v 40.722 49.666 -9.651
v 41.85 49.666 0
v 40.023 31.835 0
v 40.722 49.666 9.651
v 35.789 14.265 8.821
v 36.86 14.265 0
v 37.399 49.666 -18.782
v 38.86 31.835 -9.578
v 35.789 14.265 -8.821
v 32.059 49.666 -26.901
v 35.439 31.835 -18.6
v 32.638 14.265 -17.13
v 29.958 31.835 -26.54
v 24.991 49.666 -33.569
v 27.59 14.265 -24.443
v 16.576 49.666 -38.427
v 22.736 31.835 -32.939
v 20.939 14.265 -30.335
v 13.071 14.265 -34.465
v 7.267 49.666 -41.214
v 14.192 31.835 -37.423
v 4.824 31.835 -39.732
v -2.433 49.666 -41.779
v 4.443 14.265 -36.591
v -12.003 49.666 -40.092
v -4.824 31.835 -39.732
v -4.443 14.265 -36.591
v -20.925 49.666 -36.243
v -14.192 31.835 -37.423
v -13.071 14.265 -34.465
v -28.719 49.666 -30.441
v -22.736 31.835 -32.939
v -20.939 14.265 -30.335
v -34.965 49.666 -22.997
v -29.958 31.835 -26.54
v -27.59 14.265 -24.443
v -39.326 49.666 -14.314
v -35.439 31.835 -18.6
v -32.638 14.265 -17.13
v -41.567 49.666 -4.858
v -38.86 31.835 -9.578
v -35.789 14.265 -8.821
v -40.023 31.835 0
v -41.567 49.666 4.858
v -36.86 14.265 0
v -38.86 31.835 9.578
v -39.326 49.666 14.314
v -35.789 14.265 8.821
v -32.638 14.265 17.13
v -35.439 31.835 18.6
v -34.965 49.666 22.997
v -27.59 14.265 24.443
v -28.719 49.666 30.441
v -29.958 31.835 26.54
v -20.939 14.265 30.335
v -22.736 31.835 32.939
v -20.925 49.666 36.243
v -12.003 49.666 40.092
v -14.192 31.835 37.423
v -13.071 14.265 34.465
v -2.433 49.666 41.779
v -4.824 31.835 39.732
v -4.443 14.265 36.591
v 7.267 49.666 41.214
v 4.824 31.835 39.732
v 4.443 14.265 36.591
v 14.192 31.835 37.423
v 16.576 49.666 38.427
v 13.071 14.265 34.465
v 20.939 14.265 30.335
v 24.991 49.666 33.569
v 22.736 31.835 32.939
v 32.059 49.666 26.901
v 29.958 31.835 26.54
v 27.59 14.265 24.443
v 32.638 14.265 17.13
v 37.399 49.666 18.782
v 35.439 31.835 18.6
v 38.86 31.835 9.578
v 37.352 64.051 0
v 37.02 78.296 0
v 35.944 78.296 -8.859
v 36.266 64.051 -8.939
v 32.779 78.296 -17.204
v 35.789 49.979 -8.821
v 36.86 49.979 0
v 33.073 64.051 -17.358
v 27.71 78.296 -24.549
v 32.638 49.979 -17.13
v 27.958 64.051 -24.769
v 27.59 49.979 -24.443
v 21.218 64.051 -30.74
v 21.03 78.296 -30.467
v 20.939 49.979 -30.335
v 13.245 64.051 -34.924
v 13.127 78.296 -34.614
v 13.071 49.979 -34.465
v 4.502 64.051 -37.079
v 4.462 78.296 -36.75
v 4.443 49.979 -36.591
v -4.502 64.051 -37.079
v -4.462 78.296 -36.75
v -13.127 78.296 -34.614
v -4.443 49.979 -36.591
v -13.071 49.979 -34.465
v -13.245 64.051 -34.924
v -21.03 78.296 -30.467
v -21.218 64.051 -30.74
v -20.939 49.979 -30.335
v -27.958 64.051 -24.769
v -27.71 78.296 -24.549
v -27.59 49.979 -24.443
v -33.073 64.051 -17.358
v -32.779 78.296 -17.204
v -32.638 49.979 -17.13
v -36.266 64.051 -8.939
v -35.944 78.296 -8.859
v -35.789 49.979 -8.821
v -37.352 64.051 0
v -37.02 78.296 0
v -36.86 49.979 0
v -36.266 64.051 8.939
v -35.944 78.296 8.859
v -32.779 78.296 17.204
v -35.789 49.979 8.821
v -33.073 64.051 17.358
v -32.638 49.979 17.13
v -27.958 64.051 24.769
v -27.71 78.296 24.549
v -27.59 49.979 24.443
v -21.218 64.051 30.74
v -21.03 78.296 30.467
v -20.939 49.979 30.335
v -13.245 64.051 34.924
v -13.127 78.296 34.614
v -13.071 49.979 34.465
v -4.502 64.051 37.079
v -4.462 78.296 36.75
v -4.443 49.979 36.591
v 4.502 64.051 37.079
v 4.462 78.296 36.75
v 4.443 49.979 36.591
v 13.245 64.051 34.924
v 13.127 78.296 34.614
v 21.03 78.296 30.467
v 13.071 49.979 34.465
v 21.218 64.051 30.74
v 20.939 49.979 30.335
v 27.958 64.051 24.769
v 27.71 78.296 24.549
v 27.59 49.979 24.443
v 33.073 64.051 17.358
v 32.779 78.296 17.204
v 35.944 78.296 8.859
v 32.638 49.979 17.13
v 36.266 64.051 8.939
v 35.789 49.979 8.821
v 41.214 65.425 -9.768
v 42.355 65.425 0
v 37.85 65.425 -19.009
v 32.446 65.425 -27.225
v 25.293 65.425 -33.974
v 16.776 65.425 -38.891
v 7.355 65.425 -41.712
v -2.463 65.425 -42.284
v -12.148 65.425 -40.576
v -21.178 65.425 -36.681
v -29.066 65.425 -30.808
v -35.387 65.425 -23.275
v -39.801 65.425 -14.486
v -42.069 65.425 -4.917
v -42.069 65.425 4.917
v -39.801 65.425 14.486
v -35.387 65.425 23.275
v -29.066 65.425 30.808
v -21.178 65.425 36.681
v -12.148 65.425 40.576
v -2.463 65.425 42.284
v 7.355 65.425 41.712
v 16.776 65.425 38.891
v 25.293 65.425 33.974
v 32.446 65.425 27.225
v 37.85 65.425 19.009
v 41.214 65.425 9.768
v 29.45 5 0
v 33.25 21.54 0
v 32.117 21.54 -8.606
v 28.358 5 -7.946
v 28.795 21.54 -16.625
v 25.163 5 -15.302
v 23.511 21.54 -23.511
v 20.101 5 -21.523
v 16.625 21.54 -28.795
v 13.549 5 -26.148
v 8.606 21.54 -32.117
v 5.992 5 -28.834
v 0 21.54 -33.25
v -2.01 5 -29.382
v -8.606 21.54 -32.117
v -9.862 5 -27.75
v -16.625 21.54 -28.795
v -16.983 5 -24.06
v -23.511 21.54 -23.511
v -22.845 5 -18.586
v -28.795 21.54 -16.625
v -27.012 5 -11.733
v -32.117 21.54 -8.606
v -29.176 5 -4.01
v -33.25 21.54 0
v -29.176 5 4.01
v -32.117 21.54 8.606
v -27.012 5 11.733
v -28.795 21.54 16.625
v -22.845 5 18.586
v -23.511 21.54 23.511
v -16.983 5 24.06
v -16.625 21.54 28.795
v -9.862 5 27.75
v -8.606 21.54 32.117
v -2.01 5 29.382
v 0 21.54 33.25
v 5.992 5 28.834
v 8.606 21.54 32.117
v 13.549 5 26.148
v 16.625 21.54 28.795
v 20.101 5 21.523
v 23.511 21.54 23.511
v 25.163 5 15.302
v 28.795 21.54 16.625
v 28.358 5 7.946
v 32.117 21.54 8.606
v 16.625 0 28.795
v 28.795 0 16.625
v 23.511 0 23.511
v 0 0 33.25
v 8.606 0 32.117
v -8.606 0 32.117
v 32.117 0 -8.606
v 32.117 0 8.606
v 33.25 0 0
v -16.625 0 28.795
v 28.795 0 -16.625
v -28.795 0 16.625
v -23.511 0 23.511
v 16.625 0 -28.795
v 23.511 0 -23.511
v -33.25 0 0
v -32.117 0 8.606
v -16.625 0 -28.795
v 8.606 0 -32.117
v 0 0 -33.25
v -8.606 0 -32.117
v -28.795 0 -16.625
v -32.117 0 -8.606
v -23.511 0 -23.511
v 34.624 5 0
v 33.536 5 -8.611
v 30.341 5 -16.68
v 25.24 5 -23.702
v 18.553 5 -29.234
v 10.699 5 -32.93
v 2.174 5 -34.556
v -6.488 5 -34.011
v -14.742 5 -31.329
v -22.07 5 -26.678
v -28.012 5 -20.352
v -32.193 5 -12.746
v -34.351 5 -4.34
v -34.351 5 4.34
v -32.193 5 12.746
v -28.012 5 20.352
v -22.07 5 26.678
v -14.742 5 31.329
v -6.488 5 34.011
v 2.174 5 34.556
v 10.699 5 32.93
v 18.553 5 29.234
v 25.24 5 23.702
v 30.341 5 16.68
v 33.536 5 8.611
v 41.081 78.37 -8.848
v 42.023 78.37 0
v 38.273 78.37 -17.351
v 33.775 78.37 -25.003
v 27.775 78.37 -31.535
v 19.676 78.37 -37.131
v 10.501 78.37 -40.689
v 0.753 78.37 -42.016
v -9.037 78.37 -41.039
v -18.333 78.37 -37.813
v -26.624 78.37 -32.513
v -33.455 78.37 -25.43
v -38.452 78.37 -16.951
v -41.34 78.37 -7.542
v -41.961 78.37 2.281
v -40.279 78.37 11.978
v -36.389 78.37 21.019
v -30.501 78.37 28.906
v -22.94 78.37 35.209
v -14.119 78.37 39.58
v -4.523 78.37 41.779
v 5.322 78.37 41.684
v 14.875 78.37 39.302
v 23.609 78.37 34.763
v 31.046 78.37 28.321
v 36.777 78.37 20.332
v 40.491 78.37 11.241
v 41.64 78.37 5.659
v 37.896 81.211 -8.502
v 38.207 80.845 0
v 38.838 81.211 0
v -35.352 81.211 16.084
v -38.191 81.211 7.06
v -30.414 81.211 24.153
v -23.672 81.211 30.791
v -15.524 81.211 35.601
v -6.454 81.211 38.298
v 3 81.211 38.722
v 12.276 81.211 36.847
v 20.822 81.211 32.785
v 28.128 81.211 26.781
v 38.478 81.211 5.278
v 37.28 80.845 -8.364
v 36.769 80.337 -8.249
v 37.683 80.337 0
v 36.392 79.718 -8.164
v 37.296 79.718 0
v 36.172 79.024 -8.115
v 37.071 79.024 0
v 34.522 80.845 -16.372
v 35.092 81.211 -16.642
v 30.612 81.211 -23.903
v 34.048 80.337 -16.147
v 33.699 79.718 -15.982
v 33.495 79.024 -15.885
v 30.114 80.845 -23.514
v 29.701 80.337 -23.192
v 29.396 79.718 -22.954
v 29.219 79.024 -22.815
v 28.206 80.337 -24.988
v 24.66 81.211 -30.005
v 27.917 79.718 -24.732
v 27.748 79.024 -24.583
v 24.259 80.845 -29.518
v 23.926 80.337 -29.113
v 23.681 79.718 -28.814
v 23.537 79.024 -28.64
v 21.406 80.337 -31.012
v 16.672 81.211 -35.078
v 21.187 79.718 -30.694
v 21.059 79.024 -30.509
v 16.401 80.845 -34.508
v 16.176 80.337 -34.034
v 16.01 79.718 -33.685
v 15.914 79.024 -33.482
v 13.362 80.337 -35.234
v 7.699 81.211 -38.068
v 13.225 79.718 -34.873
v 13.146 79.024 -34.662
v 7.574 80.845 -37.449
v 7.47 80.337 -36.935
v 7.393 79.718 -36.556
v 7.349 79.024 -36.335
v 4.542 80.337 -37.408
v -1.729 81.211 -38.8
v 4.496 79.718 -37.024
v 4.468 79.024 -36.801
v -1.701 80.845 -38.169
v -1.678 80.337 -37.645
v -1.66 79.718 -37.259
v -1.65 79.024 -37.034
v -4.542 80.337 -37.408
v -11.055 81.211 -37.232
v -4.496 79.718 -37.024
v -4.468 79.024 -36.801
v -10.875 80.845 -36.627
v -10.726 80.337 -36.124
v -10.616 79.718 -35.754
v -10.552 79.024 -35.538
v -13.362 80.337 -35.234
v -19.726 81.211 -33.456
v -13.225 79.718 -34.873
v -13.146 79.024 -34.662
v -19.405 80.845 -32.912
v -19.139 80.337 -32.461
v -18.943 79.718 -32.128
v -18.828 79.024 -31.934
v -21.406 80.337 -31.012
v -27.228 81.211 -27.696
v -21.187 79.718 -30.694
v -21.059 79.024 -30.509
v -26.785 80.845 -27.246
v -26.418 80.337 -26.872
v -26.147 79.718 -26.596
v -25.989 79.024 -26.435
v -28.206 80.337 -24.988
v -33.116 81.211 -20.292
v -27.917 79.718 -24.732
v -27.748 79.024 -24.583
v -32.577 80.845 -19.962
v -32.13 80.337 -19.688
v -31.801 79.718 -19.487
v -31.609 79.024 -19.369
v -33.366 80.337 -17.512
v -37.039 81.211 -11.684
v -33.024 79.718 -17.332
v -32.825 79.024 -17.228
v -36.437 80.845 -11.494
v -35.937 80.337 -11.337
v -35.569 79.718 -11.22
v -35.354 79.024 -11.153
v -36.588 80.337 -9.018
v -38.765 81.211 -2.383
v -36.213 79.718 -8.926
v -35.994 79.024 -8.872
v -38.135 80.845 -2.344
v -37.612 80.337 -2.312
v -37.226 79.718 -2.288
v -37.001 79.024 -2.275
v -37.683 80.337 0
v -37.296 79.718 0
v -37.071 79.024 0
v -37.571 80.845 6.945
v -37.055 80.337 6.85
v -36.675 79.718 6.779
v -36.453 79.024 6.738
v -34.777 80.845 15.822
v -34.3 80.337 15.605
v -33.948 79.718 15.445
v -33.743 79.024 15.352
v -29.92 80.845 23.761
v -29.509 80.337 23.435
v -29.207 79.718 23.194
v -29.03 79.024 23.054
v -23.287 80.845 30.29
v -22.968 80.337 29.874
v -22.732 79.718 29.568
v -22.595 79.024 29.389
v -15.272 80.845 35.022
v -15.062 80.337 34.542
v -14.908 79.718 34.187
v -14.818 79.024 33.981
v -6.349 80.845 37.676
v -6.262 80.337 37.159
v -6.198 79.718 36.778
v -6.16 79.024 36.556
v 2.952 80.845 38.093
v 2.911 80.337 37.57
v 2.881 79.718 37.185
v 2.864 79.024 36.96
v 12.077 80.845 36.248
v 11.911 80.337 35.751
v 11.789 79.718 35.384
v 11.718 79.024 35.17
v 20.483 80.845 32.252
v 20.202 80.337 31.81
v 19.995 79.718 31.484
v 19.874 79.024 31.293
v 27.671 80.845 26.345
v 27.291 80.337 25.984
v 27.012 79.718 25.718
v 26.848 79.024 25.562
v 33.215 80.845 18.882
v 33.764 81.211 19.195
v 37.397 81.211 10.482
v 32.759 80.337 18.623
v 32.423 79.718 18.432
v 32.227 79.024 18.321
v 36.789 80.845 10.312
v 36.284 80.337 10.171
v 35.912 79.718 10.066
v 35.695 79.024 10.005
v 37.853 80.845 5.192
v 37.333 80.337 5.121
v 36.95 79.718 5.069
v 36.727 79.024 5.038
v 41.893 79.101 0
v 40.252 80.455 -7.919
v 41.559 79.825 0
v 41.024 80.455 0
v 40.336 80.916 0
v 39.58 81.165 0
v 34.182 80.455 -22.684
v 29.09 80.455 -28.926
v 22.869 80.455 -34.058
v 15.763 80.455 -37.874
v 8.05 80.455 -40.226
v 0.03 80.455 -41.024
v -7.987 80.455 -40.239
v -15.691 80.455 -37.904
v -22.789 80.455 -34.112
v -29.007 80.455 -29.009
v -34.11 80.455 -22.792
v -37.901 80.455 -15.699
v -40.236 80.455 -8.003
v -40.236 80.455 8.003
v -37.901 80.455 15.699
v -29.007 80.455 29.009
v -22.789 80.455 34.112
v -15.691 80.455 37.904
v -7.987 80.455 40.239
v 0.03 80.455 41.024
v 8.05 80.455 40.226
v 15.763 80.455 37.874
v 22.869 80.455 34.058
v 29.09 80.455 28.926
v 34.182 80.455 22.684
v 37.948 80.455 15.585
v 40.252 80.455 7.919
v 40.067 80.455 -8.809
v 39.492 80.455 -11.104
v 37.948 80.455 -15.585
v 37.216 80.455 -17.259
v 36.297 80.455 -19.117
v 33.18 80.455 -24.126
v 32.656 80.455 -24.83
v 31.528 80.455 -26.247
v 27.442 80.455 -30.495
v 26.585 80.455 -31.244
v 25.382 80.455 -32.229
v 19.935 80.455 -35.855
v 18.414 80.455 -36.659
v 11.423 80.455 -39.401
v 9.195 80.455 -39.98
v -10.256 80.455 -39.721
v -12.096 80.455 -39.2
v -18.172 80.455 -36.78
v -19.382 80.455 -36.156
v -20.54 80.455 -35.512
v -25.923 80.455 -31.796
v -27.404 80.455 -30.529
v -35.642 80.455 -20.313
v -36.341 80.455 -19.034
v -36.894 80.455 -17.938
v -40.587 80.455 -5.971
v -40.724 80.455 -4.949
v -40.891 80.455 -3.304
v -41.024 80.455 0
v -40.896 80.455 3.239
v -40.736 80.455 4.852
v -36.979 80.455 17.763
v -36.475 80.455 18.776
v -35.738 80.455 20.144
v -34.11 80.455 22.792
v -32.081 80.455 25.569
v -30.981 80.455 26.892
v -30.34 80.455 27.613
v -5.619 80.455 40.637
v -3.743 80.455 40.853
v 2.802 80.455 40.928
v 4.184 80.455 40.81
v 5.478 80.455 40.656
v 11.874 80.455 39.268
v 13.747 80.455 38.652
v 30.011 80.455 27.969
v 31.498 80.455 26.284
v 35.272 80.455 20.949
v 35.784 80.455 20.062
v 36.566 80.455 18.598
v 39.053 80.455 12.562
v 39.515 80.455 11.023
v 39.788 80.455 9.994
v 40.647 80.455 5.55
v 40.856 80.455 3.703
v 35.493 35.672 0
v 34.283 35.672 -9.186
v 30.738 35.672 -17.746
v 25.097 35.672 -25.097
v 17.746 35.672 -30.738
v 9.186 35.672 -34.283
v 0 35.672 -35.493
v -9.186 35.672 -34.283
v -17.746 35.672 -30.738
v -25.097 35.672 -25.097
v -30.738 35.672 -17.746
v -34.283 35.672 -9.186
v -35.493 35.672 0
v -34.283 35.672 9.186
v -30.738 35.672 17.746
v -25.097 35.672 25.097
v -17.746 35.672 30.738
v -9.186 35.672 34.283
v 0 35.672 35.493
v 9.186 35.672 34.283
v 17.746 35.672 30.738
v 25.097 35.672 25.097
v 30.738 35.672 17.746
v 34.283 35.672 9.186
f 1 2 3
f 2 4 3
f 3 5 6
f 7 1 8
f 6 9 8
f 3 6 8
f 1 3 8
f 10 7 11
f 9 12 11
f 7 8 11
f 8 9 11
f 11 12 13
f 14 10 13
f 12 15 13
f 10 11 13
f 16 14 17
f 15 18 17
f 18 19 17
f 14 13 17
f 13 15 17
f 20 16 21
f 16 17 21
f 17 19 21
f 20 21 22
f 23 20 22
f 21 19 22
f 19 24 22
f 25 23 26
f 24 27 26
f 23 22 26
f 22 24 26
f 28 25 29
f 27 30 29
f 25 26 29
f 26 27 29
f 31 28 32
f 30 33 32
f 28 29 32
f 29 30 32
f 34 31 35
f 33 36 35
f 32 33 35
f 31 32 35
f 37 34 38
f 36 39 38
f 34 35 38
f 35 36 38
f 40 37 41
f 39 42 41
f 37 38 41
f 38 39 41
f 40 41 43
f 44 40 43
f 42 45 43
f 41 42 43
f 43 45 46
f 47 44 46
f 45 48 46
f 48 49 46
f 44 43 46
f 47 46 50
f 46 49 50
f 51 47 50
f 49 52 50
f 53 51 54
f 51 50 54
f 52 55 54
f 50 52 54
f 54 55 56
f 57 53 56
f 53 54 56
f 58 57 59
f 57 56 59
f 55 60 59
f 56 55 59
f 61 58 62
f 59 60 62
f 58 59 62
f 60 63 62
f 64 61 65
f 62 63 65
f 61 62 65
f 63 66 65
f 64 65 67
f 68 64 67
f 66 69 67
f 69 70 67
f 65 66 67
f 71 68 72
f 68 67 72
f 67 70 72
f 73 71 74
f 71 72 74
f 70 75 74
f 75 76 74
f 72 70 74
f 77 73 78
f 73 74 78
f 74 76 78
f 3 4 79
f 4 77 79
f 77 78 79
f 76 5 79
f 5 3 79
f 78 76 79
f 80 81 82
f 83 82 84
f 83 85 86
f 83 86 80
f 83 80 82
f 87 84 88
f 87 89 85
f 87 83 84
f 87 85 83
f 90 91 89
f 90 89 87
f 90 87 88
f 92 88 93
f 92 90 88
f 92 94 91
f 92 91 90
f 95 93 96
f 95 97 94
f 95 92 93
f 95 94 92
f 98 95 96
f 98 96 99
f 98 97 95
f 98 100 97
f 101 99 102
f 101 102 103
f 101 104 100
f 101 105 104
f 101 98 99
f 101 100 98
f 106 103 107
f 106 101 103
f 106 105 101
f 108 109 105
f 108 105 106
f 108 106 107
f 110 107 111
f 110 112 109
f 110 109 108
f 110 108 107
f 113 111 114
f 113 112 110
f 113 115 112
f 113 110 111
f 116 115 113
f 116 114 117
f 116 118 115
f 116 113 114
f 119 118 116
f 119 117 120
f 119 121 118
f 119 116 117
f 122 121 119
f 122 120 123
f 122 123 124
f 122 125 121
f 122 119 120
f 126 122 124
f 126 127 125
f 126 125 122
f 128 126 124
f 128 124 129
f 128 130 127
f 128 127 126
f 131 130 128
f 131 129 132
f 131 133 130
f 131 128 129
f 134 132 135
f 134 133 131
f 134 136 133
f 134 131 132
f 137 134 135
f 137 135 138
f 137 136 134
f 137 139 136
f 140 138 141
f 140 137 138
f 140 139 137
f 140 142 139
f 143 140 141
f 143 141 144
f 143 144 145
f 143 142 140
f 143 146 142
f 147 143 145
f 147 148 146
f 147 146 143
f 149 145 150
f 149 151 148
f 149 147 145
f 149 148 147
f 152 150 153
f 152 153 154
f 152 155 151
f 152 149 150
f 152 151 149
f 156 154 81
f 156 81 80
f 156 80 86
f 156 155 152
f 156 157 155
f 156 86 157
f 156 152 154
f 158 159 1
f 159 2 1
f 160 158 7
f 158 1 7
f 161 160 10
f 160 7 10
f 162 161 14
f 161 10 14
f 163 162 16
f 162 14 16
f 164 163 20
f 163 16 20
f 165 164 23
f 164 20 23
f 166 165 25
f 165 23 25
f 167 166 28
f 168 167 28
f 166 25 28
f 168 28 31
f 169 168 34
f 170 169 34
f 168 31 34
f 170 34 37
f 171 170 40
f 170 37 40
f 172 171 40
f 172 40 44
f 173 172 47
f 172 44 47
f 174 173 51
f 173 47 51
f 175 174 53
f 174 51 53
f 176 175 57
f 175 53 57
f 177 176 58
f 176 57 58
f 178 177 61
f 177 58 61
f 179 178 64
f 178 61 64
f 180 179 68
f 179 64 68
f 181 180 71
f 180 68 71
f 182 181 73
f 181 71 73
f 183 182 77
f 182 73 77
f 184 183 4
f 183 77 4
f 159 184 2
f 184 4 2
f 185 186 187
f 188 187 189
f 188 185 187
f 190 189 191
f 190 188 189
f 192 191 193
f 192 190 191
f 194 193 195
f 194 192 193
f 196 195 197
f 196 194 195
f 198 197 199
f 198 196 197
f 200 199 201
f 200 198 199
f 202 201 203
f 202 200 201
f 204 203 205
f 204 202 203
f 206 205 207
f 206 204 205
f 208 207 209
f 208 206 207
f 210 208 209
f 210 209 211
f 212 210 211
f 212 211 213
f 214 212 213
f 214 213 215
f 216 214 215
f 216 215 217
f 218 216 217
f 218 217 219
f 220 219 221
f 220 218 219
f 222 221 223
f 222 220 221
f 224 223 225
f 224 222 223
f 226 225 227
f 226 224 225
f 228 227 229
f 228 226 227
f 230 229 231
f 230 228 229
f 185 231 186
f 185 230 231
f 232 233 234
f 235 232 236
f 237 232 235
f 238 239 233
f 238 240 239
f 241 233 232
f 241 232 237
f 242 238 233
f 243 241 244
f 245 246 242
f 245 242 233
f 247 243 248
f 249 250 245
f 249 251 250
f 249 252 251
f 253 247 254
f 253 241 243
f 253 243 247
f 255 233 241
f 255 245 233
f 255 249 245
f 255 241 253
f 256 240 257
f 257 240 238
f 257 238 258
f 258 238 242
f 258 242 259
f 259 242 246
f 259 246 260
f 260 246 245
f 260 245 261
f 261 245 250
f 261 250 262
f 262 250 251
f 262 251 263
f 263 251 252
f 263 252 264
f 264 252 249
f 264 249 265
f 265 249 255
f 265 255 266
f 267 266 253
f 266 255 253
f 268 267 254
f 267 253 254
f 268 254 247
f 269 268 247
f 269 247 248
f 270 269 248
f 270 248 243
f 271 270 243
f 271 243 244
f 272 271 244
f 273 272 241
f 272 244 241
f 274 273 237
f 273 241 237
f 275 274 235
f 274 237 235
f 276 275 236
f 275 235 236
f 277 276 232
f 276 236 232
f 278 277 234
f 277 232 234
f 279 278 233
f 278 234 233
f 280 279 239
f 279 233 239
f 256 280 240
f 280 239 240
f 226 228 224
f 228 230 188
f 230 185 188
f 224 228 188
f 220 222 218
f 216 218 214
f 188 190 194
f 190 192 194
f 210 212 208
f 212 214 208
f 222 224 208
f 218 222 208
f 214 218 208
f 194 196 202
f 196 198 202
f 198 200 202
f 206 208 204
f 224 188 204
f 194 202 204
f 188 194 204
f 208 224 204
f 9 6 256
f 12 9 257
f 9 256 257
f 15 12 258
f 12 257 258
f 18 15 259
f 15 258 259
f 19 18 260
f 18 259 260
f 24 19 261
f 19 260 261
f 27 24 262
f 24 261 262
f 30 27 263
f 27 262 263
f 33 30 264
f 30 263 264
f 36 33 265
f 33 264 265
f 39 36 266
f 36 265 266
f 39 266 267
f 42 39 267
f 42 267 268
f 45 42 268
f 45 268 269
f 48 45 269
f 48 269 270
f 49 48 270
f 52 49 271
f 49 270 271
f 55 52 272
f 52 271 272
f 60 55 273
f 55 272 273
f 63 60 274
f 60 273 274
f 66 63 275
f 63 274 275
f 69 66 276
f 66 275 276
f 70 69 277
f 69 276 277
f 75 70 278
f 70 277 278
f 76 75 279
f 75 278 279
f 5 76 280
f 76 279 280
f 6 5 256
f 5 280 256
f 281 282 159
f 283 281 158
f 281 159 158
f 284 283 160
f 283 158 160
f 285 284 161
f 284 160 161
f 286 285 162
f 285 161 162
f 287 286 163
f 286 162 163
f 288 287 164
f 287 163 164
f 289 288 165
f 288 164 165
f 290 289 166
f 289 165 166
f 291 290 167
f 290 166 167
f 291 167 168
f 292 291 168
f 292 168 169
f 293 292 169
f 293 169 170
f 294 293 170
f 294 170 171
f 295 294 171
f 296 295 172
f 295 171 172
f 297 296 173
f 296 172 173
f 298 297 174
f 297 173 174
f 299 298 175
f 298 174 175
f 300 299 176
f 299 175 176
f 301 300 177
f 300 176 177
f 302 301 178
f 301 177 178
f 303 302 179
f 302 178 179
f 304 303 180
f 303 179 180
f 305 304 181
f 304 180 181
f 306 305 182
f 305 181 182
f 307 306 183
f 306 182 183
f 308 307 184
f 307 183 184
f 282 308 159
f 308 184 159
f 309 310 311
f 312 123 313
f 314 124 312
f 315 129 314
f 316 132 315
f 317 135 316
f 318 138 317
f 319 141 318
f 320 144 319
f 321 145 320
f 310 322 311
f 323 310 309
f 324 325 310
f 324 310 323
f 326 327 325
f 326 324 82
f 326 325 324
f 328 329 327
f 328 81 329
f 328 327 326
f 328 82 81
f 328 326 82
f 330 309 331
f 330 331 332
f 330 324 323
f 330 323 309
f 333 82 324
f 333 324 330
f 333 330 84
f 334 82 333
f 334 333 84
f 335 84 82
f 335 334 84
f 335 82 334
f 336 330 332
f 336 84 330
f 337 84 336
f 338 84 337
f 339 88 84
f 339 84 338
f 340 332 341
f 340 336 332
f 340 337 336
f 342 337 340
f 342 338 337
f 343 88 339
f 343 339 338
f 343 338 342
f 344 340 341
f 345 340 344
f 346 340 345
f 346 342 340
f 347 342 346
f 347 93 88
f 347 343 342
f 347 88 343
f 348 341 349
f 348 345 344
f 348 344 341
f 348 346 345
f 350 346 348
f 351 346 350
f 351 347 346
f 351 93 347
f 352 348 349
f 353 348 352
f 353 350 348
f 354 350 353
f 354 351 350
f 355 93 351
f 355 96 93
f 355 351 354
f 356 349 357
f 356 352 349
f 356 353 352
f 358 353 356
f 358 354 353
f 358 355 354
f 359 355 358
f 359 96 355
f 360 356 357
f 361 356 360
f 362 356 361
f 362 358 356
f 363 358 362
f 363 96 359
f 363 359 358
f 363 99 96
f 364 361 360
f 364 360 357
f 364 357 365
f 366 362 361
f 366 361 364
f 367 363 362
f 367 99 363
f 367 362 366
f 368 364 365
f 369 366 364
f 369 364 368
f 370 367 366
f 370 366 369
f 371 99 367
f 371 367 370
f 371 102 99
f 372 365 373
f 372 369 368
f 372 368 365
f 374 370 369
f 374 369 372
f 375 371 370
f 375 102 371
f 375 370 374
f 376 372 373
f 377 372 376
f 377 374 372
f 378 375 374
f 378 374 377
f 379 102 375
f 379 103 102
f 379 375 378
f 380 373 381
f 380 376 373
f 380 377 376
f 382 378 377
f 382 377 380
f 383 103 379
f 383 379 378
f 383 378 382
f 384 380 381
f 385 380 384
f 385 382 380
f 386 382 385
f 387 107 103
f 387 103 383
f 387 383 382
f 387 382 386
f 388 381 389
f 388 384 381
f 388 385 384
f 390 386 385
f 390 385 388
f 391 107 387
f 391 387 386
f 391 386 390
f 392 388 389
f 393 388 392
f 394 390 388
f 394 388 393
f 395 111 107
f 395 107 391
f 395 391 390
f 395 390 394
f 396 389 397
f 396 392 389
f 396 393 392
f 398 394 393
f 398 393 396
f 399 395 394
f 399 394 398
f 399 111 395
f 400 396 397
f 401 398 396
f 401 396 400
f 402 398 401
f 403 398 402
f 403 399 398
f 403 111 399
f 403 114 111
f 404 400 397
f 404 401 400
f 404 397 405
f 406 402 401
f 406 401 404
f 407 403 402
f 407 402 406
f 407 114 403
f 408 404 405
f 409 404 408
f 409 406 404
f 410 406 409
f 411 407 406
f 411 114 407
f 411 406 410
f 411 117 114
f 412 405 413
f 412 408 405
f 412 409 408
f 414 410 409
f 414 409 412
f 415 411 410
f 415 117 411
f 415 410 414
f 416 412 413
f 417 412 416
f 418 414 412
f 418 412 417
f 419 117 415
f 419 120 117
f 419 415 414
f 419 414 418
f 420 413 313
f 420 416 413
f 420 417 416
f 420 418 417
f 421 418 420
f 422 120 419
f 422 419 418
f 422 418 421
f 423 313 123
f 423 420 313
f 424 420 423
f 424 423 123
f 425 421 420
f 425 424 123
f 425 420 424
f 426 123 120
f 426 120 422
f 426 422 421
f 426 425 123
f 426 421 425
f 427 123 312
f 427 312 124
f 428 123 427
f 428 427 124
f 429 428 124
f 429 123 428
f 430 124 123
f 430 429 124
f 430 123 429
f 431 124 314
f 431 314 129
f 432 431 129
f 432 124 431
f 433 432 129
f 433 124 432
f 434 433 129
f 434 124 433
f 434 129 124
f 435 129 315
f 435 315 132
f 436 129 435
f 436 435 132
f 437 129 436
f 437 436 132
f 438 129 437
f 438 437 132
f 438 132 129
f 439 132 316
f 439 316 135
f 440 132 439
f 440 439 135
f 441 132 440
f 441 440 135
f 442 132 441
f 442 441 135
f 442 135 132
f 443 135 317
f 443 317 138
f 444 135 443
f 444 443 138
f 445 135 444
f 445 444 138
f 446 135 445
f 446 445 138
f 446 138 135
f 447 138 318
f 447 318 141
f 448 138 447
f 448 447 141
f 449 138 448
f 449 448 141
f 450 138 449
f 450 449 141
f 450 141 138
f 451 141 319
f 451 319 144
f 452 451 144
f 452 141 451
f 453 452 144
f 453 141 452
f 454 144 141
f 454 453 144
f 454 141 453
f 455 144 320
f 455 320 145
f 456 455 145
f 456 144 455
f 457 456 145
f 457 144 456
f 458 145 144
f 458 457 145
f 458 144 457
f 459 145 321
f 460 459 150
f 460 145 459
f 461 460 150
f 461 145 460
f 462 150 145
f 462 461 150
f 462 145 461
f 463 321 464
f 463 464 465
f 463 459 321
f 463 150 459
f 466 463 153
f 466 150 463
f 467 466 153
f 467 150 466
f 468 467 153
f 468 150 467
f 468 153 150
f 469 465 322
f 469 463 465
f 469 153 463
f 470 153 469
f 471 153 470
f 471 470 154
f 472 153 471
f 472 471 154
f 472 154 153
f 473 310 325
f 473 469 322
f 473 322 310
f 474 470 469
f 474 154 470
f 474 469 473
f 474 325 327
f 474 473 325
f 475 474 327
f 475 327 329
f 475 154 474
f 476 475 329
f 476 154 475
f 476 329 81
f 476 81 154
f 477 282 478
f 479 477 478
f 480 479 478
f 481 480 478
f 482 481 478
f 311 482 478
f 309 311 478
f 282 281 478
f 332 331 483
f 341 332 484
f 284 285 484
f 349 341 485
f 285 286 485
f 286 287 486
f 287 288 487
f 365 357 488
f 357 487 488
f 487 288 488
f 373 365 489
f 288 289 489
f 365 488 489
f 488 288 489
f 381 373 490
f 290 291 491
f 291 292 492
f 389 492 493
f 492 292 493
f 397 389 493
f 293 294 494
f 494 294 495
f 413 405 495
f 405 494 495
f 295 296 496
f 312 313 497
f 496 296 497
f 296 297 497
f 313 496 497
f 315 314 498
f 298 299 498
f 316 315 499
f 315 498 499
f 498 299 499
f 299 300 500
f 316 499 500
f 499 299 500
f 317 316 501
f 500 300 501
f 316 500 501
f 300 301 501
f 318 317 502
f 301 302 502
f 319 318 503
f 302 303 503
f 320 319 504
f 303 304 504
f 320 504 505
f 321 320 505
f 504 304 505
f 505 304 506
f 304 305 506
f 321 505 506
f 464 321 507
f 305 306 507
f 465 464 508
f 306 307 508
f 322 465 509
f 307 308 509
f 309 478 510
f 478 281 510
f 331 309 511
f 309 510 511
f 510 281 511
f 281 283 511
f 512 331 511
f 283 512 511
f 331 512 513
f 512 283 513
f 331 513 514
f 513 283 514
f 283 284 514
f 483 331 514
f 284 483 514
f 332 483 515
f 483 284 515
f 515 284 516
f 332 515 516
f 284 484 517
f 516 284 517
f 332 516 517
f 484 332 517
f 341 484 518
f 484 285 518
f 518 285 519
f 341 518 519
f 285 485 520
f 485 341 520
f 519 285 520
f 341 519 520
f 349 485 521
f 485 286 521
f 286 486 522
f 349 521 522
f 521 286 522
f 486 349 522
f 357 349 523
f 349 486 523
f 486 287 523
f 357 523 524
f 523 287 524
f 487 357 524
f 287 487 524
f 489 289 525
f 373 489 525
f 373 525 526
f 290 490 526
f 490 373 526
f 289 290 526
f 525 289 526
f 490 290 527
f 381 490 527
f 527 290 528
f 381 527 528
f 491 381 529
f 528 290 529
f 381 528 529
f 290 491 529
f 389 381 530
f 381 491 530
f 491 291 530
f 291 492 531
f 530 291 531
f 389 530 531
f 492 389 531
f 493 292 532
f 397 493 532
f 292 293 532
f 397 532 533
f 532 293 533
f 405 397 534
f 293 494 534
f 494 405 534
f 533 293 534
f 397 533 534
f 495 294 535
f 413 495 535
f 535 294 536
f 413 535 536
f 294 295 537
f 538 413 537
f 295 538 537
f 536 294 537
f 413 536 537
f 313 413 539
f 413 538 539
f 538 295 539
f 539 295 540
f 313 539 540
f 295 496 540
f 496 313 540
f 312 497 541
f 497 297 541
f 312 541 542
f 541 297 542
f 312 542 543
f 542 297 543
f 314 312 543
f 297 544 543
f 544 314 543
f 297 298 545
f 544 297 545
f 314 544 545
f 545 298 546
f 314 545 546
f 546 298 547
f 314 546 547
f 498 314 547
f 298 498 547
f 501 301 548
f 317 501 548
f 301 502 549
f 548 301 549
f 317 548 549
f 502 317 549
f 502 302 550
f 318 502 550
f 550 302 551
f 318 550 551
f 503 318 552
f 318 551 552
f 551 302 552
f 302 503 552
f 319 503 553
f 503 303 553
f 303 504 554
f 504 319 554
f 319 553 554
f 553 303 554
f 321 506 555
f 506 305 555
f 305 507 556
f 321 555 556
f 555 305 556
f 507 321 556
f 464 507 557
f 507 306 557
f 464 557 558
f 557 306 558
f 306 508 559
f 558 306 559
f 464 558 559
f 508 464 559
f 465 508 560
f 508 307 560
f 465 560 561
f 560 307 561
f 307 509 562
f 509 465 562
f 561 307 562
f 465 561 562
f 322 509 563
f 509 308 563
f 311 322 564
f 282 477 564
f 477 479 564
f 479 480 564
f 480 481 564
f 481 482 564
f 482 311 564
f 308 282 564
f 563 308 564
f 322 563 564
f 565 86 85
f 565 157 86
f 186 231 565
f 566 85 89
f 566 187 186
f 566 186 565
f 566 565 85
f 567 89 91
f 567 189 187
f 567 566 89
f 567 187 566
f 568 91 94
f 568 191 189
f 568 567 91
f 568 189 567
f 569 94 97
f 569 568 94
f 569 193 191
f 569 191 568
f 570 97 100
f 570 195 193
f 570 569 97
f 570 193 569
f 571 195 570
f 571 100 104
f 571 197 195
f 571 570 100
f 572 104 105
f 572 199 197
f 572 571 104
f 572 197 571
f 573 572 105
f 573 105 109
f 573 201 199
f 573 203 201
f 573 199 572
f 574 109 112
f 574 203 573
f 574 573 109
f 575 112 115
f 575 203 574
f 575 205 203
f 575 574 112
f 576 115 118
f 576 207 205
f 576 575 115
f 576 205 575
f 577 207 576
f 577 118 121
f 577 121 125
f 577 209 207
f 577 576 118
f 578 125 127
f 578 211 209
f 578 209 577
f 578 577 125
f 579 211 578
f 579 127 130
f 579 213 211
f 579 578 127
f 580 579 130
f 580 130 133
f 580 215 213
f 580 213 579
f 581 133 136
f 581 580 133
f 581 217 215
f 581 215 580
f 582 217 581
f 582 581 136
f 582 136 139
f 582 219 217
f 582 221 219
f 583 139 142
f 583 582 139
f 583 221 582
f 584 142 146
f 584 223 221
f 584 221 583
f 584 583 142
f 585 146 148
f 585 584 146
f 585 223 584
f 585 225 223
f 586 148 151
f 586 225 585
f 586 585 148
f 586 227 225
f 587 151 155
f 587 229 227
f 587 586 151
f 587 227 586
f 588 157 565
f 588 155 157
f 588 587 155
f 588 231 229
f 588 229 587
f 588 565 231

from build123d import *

# Parameters (mm, degrees)
REVOLVE_THIN1_OUTLINE_W   = 29.450267211
REVOLVE_THIN1_OUTLINE_H   = 5
REVOLVE_THIN1_OUTLINE_W_2 = 3.799732789
FILLET1_R                 = 3
FILLET2_R                 = 3


with BuildPart() as part:
    # Revolve-Thin1: read off the stored shape, not the designer's step
    # Revolve-Thin1 outline → Revolve-Thin1 (revolve)
    with BuildSketch(Plane.XY):
        with Locations((14.725133606, 2.5)):
            Rectangle(REVOLVE_THIN1_OUTLINE_W, REVOLVE_THIN1_OUTLINE_H)
        with BuildLine():
            add(Edge.make_bspline(
                [(33.25, 21.540462794), (32.189733803, 15.987039243), (30.923436105, 10.473906002), (29.450267211, 5)],
                knots=[0.776958098, 0.776958098, 0.776958098, 0.776958098, 1, 1, 1, 1], degree=3))
            Line((29.450267211, 5), (33.25, 5))
            Line((33.25, 5), (33.25, 21.540462794))
        make_face()
        with Locations((31.350133606, 2.5)):
            Rectangle(REVOLVE_THIN1_OUTLINE_W_2, REVOLVE_THIN1_OUTLINE_H)
        with BuildLine():
            add(Edge.make_bspline(
                [(36.859842979, 49.97897652), (36.696432633, 47.449856459), (36.492584883, 44.929039429), (35.565452083, 35.394305381), (34.566565666, 28.436322344), (33.25, 21.540462794)],
                knots=[0.400901641, 0.400901641, 0.400901641, 0.400901641, 0.5, 0.5, 0.776958098, 0.776958098, 0.776958098, 0.776958098], degree=3))
            Line((33.25, 21.540462794), (33.25, 5))
            Line((33.25, 5), (34.624179934, 5))
            add(Edge.make_bspline(
                [(36.859842979, 14.264797136), (36.178275367, 11.164191598), (35.433094422, 8.075928422), (34.624179934, 5)],
                knots=[0.81982334, 0.81982334, 0.81982334, 0.81982334, 0.936591868, 0.936591868, 0.936591868, 0.936591868], degree=3))
            Line((36.859842979, 14.264797136), (36.859842979, 49.97897652))
        make_face()
        with BuildLine():
            Line((34.624179934, 5), (33.25, 5))
            Line((33.25, 5), (33.25, 0))
            add(Edge.make_bspline(
                [(34.624179934, 5), (34.184919817, 3.329696526), (33.726866255, 1.663030265), (33.25, 0)],
                knots=[0.936591868, 0.936591868, 0.936591868, 0.936591868, 1, 1, 1, 1], degree=3))
        make_face()
        with BuildLine():
            add(Edge.make_bspline(
                [(36.859842979, 81.086419218), (37.520194687, 70.57793496), (37.520918259, 60.210512009), (36.859842979, 49.97897652)],
                knots=[0, 0, 0, 0, 0.400901641, 0.400901641, 0.400901641, 0.400901641], degree=3))
            Line((36.859842979, 49.97897652), (36.859842979, 14.264797136))
            add(Edge.make_bspline(
                [(41.85, 49.665684489), (41.076850789, 37.691576327), (39.415577842, 25.891414258), (36.859842979, 14.264797136)],
                knots=[0.381965979, 0.381965979, 0.381965979, 0.381965979, 0.81982334, 0.81982334, 0.81982334, 0.81982334], degree=3))
            Line((41.85, 49.665684489), (41.85, 81.086419218))
            Line((41.85, 81.086419218), (36.859842979, 81.086419218))
        make_face()
        Polygon((41.85, 81.4), (36.859842979, 81.086419218), (41.85, 81.086419218), align=None)
        with BuildLine():
            add(Edge.make_bspline(
                [(41.85, 81.4), (41.856569252, 81.295460437), (41.863074519, 81.19093351), (41.869515798, 81.086419218)],
                knots=[0, 0, 0, 0, 0.003728115, 0.003728115, 0.003728115, 0.003728115], degree=3))
            Line((41.85, 81.4), (41.85, 81.086419218))
            Line((41.85, 81.086419218), (41.869515798, 81.086419218))
        make_face()
        with BuildLine():
            Line((41.869515798, 81.086419218), (41.85, 81.086419218))
            Line((41.85, 81.086419218), (41.85, 49.665684489))
            add(Edge.make_bspline(
                [(42.355318185, 65.4252057), (42.355318195, 60.138951042), (42.187053846, 54.885788383), (41.85, 49.665684489)],
                knots=[0.191082375, 0.191082375, 0.191082375, 0.191082375, 0.381965979, 0.381965979, 0.381965979, 0.381965979], degree=3))
            add(Edge.make_bspline(
                [(41.869515798, 81.086419218), (42.193218531, 75.834114157), (42.355318175, 70.613720127), (42.355318185, 65.4252057)],
                knots=[0.003728115, 0.003728115, 0.003728115, 0.003728115, 0.191082375, 0.191082375, 0.191082375, 0.191082375], degree=3))
        make_face()
    revolve(axis=Axis((0, 0, 0), (0, 1, 0)))

    # Fillet1
    fillet1_edges = [part.edges().sort_by_distance(p)[0] for p in [
        (-41.85, 81.4, 0),
    ]]
    fillet(fillet1_edges, radius=FILLET1_R)

    # Fillet2
    # the kernel refuses this fillet: 3 mm, written as the material it takes off along each edge
    with BuildSketch(Plane(origin=(0, 81.086419218, 0), x_dir=(1, 0, 0), z_dir=(0, 0, 1))) as fillet2_piece_1:
        with BuildLine():
            CenterArc((40.015828759, -2.634967847), FILLET2_R, 113.107886202, 69.859477004)
            Line((37.019851206, -2.790269174), (36.959931655, -2.7933752))
            ThreePointArc((36.959931655, -2.7933752), (36.883770687, -1.398350534), (36.799961095, -0.003762969))
            Line((36.799961095, -0.003762969), (36.85608001, 0.059881884))
            ThreePointArc((36.85608001, 0.059881884), (37.845377324, 0.122049192), (38.814889784, 0.179520664))
            Line((38.814889784, 0.179520664), (38.838437607, 0.124334615))
        make_face()
    revolve(axis=Axis((0, 81.086419218, 0), (0, 1, 0)), mode=Mode.SUBTRACT)


solid = part.part
